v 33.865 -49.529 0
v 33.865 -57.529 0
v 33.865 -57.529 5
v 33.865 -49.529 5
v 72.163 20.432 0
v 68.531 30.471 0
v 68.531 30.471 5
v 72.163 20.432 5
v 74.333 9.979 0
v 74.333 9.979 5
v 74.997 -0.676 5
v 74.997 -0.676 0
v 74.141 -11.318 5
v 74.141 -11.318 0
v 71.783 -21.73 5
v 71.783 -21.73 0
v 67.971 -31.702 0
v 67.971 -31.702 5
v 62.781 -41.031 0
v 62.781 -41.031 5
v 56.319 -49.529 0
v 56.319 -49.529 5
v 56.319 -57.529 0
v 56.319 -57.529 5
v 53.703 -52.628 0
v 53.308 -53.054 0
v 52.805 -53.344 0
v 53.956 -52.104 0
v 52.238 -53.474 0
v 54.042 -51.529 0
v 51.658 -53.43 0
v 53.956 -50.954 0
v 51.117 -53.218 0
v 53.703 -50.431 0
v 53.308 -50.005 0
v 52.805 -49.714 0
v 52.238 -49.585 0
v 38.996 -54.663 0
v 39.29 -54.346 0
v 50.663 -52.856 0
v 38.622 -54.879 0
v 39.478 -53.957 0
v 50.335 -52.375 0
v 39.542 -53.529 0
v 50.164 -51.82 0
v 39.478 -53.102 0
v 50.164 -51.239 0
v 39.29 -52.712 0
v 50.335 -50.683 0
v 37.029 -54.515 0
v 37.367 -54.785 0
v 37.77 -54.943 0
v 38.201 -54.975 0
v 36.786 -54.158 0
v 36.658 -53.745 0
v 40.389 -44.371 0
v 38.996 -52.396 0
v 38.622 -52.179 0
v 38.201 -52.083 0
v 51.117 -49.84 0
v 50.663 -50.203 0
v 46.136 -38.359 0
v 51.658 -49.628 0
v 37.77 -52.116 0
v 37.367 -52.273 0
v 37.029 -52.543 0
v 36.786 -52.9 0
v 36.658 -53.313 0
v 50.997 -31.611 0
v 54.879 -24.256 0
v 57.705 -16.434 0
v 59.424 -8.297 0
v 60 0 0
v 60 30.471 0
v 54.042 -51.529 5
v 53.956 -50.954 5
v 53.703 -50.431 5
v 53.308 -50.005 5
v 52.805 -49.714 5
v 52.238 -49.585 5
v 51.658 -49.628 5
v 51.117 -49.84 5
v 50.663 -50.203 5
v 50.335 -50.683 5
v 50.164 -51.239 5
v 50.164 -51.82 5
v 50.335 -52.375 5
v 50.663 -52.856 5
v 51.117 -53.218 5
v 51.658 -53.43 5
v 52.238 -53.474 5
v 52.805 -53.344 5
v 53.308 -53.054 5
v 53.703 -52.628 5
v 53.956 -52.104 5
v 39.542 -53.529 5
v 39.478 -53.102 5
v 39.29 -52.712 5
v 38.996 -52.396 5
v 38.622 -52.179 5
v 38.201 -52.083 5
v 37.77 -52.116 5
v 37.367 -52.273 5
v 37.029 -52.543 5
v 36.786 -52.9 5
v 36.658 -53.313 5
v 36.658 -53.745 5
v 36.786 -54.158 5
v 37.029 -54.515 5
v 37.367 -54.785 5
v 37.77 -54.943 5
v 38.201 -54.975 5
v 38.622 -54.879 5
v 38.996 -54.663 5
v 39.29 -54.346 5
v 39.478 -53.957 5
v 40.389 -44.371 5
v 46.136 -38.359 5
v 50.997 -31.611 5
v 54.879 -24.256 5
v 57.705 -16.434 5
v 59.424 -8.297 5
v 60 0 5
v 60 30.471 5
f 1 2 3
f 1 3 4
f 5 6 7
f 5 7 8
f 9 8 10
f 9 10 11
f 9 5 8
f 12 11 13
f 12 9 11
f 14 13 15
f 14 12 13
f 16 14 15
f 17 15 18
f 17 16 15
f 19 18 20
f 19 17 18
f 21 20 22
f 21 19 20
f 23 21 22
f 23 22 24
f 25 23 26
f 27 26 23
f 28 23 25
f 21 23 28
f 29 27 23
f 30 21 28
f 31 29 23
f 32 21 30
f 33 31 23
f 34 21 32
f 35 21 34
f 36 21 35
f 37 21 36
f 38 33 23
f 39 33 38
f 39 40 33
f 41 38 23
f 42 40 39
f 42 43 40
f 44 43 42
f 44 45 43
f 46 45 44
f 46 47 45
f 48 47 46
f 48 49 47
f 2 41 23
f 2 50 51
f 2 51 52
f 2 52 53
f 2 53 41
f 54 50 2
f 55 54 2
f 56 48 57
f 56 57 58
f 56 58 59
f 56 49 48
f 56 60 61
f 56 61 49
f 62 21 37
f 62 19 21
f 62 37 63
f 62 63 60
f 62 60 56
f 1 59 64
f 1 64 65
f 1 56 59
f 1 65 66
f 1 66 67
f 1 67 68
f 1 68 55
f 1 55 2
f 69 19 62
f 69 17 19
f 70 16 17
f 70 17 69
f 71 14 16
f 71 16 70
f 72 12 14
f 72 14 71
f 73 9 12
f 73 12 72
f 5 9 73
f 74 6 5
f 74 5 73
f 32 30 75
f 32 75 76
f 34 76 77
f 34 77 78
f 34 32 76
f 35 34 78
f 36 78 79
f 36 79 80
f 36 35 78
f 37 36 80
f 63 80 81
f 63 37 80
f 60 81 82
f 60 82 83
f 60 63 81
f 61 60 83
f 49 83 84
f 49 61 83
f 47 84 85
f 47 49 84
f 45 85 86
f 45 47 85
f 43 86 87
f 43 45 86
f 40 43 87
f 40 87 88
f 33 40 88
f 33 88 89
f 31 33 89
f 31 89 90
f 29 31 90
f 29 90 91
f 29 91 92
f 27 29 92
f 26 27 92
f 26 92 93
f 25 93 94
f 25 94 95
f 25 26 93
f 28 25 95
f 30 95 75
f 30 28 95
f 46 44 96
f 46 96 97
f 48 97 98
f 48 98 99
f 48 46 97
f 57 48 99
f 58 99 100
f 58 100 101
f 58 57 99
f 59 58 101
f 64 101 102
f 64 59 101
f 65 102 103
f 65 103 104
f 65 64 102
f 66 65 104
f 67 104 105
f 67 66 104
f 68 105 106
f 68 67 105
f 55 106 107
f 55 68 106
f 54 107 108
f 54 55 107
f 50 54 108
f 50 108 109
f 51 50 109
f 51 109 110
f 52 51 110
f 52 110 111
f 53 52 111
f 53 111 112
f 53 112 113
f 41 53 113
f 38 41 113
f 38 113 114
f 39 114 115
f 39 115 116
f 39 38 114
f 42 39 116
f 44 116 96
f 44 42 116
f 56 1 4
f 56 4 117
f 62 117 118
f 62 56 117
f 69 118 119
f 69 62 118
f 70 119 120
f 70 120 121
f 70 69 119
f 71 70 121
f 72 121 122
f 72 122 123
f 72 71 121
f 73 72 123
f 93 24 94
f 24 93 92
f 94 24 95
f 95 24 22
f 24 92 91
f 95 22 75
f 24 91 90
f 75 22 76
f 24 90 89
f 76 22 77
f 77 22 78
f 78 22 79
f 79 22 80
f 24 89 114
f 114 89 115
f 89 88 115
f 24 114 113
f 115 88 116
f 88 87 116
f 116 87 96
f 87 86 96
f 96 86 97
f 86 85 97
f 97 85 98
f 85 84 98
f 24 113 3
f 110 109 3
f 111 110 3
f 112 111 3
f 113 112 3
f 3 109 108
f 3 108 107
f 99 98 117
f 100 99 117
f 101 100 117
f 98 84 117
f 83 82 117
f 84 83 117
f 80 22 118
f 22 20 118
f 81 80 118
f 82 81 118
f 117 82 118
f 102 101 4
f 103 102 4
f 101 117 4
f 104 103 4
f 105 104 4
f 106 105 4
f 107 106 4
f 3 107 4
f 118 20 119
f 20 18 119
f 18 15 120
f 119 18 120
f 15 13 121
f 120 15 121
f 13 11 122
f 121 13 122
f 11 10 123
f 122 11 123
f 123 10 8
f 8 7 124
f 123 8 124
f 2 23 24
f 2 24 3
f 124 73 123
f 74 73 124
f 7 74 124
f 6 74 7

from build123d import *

# Parameters (mm, degrees)
SKETCH1_R           = 1.45
SKETCH1_R_2         = 1.95
BOSS_EXTRUDE1_DEPTH = 5


with BuildPart() as part:
    # Sketch1 → Boss-Extrude1 (new body)
    with BuildSketch(Plane.XY):
        with BuildLine():
            Line((60, 30.470821026), (68.531226941, 30.470821026))
            ThreePointArc((68.531226941, 30.470821026), (74.141161233, -11.317606244), (56.31927228, -49.529178974))
            Line((56.31927228, -49.529178974), (56.31927228, -57.529178974))
            Line((56.31927228, -57.529178974), (33.865327846, -57.529178974))
            Line((33.865327846, -57.529178974), (33.865327846, -49.529178974))
            ThreePointArc((33.865327846, -49.529178974), (53.065618204, -28.000717216), (60, 0))
            Line((60, 0), (60, 30.470821026))
        make_face()
        with Locations((38.092300063, -53.529178974)):
            Circle(SKETCH1_R, mode=Mode.SUBTRACT)
        with Locations((52.092300063, -51.529178974)):
            Circle(SKETCH1_R_2, mode=Mode.SUBTRACT)
    extrude(amount=BOSS_EXTRUDE1_DEPTH)


solid = part.part
